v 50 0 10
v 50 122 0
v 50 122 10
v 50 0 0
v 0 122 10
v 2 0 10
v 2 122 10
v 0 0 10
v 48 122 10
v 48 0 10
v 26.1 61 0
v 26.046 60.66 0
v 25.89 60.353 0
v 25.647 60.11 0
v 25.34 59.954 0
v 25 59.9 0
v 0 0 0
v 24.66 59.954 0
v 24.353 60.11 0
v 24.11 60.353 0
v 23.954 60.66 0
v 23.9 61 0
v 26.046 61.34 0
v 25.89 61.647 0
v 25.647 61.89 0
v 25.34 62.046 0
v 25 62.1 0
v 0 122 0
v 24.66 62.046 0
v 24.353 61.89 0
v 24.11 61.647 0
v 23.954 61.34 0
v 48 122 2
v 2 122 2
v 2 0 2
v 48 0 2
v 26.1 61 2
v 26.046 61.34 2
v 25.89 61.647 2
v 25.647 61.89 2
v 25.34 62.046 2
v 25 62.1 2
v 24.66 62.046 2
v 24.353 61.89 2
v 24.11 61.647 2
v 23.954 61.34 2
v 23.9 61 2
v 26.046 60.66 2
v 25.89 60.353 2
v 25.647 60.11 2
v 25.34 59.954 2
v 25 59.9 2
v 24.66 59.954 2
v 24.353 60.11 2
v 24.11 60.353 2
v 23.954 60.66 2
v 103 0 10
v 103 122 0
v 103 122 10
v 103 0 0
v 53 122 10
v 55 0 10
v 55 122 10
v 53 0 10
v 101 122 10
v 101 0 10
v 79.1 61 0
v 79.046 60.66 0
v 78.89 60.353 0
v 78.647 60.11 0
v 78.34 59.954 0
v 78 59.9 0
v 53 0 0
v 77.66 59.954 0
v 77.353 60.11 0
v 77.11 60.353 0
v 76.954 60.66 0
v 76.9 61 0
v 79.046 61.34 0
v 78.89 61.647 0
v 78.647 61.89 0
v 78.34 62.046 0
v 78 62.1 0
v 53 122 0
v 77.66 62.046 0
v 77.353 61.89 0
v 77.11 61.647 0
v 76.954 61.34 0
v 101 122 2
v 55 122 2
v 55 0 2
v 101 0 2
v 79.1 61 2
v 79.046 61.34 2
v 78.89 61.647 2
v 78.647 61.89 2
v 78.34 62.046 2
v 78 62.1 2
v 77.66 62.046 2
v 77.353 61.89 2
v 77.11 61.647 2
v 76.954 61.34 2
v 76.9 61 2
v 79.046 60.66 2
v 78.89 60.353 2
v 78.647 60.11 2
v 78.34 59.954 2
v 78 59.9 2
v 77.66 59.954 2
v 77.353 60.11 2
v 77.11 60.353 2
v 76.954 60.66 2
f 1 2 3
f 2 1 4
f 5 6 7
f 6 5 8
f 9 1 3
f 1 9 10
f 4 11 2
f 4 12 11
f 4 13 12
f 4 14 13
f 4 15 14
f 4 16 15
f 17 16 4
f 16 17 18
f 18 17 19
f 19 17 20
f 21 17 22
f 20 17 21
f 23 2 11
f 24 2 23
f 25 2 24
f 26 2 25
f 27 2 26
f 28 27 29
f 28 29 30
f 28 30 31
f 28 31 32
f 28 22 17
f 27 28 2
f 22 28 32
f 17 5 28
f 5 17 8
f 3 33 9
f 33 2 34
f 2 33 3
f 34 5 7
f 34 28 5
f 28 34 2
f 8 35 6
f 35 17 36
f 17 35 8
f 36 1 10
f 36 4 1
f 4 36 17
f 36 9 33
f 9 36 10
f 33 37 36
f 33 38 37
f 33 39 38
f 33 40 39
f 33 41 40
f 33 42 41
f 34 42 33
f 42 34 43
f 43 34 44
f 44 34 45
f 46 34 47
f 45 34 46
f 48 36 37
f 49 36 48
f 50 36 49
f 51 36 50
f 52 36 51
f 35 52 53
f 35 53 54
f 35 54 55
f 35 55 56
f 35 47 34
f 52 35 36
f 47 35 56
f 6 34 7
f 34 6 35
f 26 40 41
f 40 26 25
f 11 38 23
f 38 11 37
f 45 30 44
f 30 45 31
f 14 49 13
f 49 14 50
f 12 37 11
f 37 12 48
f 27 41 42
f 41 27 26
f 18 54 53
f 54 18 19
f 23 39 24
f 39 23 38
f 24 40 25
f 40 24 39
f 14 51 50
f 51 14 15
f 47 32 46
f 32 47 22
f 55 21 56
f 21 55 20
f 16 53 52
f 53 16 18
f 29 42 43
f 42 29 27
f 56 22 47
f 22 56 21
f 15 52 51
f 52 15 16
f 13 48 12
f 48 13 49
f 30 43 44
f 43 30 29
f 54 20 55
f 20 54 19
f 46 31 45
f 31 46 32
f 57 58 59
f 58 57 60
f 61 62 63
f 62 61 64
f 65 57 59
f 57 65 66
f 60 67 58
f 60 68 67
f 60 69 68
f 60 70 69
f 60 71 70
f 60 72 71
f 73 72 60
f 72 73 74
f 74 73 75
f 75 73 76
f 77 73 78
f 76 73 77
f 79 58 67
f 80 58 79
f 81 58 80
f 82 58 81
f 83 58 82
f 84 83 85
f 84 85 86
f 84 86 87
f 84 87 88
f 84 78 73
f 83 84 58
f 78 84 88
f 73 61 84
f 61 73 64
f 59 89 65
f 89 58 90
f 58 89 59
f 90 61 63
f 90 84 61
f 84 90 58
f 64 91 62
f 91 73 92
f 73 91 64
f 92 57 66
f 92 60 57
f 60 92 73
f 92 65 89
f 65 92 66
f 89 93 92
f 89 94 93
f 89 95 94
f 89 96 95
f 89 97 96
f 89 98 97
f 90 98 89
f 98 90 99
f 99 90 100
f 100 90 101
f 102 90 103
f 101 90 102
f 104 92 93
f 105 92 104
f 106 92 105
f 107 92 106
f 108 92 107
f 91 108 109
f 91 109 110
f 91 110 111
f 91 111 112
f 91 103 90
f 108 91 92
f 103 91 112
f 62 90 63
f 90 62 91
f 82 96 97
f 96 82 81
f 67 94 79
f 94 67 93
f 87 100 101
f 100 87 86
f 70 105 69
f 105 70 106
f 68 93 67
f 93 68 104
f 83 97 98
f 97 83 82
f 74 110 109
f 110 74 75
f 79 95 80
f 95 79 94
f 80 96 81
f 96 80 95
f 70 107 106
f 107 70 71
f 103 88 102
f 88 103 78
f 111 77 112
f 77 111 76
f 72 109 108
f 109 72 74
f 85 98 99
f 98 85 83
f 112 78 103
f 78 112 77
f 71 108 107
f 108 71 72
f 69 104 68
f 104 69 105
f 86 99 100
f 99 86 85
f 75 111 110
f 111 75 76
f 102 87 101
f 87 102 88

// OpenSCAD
// ============================================================
// PRINT: TRILHOS WEGA MOTOR (Posição 3 — X=125mm)
// 4 peças idênticas — canal 46mm (filtro 45mm + folga)
// ============================================================
// ATENÇÃO: 4 peças (4×53mm = 212mm) NÃO cabem juntas!
// Impressão em 2 rodadas de 2 peças cada.
// Mesa: 106mm × 122mm por rodada ✓
// Tempo estimado: ~1h por rodada (2h total)
// ============================================================
// Rodada 1: descomentar RODADA_1
// Rodada 2: descomentar RODADA_2
// ============================================================

use <TRILHO_FILTRO.scad>

gap = 3;
canal = 46;
largura = canal + 2*2; // 50mm

// === RODADA 1 — 2 peças (lateral esquerda) ===
for (i = [0:1]) {
    translate([i * (largura + gap), 0, 0])
        trilho_metade_a(canal);
}

// === RODADA 2 — 2 peças (lateral direita) ===
// Descomente abaixo e comente a Rodada 1
/*
for (i = [0:1]) {
    translate([i * (largura + gap), 0, 0])
        trilho_metade_a(canal);
}
*/

// Guia visual da mesa (não imprime)
%translate([0, 0, -0.5])
    cube([200, 200, 0.1]);
